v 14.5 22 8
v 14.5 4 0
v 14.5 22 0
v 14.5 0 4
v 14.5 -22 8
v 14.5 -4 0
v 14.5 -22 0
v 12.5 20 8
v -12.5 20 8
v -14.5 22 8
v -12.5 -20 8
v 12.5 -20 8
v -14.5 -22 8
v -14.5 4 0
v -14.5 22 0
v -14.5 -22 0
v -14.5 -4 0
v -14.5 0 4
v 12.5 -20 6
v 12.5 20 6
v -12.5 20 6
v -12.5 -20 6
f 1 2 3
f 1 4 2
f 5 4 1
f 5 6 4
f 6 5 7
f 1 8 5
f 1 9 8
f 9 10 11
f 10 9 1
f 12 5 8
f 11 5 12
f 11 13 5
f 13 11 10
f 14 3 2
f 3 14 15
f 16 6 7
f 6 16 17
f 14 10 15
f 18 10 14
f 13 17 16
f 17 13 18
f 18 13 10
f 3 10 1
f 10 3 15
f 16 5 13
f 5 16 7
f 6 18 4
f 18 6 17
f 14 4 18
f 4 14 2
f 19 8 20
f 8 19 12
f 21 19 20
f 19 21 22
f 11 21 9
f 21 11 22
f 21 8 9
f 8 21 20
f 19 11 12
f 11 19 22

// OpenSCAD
/*
 * Bar Clamp Rod Adapter (Parametric), v0.42
 *
 * by Alex Franke (CodeCreations), Jan 2013
 * http://www.theFrankes.com
 * 
 * Licenced under Creative Commons Attribution - Non-Commercial - Share Alike 3.0 
 * 
 * DESCRIPTION: This adapter makes it eacy to clamp rods down to a flat surface with 
 *   a bar clamp.  
 * 
 * INSTRUCTIONS: Choose some values in the "User-defined values" section if 
 *   necessary, render, and print. Print with several walls and higher infill for 
 *   added strength.  
 * 
 * v0.42, Jan 23, 2013: Initial Release.
 * 
 * TODO: 
 *   * None at this time
 */

/////////////////////////////////////////////////////////////////////////////
// User-defined values... 
/////////////////////////////////////////////////////////////////////////////

// The length of the clamp jaw
jawLength = 40; 

// The width of the clamp jaw 
jawWidth = 25; 

// The thickness of the lip surrounding the clamp jaw
lipThickness = 2; 

// The height of the lip surrounding the clamp jaw
lipHeight = 2; 

// The depth of the groove 
grooveDepth = 4; 

// The minimum thickness of the adapter (at the top of the groove) 
minimumThickness = 2;


/////////////////////////////////////////////////////////////////////////////
// The code... 
/////////////////////////////////////////////////////////////////////////////
totalSize = [jawWidth+lipThickness*2,jawLength+lipThickness*2,grooveDepth+minimumThickness+lipHeight];

difference() {
	translate([0,0,totalSize[2]/2]) 
		cube(totalSize, center=true);

	translate([-(totalSize[0]+1)/2,0,grooveDepth]) 
		rotate([-135,0,0]) 
			cube([totalSize[0]+1,grooveDepth*2,grooveDepth*2]);

	translate([0,0,(lipHeight+1)/2+grooveDepth+minimumThickness]) 
		cube([jawWidth,jawLength,lipHeight+1], center=true);

}
	

